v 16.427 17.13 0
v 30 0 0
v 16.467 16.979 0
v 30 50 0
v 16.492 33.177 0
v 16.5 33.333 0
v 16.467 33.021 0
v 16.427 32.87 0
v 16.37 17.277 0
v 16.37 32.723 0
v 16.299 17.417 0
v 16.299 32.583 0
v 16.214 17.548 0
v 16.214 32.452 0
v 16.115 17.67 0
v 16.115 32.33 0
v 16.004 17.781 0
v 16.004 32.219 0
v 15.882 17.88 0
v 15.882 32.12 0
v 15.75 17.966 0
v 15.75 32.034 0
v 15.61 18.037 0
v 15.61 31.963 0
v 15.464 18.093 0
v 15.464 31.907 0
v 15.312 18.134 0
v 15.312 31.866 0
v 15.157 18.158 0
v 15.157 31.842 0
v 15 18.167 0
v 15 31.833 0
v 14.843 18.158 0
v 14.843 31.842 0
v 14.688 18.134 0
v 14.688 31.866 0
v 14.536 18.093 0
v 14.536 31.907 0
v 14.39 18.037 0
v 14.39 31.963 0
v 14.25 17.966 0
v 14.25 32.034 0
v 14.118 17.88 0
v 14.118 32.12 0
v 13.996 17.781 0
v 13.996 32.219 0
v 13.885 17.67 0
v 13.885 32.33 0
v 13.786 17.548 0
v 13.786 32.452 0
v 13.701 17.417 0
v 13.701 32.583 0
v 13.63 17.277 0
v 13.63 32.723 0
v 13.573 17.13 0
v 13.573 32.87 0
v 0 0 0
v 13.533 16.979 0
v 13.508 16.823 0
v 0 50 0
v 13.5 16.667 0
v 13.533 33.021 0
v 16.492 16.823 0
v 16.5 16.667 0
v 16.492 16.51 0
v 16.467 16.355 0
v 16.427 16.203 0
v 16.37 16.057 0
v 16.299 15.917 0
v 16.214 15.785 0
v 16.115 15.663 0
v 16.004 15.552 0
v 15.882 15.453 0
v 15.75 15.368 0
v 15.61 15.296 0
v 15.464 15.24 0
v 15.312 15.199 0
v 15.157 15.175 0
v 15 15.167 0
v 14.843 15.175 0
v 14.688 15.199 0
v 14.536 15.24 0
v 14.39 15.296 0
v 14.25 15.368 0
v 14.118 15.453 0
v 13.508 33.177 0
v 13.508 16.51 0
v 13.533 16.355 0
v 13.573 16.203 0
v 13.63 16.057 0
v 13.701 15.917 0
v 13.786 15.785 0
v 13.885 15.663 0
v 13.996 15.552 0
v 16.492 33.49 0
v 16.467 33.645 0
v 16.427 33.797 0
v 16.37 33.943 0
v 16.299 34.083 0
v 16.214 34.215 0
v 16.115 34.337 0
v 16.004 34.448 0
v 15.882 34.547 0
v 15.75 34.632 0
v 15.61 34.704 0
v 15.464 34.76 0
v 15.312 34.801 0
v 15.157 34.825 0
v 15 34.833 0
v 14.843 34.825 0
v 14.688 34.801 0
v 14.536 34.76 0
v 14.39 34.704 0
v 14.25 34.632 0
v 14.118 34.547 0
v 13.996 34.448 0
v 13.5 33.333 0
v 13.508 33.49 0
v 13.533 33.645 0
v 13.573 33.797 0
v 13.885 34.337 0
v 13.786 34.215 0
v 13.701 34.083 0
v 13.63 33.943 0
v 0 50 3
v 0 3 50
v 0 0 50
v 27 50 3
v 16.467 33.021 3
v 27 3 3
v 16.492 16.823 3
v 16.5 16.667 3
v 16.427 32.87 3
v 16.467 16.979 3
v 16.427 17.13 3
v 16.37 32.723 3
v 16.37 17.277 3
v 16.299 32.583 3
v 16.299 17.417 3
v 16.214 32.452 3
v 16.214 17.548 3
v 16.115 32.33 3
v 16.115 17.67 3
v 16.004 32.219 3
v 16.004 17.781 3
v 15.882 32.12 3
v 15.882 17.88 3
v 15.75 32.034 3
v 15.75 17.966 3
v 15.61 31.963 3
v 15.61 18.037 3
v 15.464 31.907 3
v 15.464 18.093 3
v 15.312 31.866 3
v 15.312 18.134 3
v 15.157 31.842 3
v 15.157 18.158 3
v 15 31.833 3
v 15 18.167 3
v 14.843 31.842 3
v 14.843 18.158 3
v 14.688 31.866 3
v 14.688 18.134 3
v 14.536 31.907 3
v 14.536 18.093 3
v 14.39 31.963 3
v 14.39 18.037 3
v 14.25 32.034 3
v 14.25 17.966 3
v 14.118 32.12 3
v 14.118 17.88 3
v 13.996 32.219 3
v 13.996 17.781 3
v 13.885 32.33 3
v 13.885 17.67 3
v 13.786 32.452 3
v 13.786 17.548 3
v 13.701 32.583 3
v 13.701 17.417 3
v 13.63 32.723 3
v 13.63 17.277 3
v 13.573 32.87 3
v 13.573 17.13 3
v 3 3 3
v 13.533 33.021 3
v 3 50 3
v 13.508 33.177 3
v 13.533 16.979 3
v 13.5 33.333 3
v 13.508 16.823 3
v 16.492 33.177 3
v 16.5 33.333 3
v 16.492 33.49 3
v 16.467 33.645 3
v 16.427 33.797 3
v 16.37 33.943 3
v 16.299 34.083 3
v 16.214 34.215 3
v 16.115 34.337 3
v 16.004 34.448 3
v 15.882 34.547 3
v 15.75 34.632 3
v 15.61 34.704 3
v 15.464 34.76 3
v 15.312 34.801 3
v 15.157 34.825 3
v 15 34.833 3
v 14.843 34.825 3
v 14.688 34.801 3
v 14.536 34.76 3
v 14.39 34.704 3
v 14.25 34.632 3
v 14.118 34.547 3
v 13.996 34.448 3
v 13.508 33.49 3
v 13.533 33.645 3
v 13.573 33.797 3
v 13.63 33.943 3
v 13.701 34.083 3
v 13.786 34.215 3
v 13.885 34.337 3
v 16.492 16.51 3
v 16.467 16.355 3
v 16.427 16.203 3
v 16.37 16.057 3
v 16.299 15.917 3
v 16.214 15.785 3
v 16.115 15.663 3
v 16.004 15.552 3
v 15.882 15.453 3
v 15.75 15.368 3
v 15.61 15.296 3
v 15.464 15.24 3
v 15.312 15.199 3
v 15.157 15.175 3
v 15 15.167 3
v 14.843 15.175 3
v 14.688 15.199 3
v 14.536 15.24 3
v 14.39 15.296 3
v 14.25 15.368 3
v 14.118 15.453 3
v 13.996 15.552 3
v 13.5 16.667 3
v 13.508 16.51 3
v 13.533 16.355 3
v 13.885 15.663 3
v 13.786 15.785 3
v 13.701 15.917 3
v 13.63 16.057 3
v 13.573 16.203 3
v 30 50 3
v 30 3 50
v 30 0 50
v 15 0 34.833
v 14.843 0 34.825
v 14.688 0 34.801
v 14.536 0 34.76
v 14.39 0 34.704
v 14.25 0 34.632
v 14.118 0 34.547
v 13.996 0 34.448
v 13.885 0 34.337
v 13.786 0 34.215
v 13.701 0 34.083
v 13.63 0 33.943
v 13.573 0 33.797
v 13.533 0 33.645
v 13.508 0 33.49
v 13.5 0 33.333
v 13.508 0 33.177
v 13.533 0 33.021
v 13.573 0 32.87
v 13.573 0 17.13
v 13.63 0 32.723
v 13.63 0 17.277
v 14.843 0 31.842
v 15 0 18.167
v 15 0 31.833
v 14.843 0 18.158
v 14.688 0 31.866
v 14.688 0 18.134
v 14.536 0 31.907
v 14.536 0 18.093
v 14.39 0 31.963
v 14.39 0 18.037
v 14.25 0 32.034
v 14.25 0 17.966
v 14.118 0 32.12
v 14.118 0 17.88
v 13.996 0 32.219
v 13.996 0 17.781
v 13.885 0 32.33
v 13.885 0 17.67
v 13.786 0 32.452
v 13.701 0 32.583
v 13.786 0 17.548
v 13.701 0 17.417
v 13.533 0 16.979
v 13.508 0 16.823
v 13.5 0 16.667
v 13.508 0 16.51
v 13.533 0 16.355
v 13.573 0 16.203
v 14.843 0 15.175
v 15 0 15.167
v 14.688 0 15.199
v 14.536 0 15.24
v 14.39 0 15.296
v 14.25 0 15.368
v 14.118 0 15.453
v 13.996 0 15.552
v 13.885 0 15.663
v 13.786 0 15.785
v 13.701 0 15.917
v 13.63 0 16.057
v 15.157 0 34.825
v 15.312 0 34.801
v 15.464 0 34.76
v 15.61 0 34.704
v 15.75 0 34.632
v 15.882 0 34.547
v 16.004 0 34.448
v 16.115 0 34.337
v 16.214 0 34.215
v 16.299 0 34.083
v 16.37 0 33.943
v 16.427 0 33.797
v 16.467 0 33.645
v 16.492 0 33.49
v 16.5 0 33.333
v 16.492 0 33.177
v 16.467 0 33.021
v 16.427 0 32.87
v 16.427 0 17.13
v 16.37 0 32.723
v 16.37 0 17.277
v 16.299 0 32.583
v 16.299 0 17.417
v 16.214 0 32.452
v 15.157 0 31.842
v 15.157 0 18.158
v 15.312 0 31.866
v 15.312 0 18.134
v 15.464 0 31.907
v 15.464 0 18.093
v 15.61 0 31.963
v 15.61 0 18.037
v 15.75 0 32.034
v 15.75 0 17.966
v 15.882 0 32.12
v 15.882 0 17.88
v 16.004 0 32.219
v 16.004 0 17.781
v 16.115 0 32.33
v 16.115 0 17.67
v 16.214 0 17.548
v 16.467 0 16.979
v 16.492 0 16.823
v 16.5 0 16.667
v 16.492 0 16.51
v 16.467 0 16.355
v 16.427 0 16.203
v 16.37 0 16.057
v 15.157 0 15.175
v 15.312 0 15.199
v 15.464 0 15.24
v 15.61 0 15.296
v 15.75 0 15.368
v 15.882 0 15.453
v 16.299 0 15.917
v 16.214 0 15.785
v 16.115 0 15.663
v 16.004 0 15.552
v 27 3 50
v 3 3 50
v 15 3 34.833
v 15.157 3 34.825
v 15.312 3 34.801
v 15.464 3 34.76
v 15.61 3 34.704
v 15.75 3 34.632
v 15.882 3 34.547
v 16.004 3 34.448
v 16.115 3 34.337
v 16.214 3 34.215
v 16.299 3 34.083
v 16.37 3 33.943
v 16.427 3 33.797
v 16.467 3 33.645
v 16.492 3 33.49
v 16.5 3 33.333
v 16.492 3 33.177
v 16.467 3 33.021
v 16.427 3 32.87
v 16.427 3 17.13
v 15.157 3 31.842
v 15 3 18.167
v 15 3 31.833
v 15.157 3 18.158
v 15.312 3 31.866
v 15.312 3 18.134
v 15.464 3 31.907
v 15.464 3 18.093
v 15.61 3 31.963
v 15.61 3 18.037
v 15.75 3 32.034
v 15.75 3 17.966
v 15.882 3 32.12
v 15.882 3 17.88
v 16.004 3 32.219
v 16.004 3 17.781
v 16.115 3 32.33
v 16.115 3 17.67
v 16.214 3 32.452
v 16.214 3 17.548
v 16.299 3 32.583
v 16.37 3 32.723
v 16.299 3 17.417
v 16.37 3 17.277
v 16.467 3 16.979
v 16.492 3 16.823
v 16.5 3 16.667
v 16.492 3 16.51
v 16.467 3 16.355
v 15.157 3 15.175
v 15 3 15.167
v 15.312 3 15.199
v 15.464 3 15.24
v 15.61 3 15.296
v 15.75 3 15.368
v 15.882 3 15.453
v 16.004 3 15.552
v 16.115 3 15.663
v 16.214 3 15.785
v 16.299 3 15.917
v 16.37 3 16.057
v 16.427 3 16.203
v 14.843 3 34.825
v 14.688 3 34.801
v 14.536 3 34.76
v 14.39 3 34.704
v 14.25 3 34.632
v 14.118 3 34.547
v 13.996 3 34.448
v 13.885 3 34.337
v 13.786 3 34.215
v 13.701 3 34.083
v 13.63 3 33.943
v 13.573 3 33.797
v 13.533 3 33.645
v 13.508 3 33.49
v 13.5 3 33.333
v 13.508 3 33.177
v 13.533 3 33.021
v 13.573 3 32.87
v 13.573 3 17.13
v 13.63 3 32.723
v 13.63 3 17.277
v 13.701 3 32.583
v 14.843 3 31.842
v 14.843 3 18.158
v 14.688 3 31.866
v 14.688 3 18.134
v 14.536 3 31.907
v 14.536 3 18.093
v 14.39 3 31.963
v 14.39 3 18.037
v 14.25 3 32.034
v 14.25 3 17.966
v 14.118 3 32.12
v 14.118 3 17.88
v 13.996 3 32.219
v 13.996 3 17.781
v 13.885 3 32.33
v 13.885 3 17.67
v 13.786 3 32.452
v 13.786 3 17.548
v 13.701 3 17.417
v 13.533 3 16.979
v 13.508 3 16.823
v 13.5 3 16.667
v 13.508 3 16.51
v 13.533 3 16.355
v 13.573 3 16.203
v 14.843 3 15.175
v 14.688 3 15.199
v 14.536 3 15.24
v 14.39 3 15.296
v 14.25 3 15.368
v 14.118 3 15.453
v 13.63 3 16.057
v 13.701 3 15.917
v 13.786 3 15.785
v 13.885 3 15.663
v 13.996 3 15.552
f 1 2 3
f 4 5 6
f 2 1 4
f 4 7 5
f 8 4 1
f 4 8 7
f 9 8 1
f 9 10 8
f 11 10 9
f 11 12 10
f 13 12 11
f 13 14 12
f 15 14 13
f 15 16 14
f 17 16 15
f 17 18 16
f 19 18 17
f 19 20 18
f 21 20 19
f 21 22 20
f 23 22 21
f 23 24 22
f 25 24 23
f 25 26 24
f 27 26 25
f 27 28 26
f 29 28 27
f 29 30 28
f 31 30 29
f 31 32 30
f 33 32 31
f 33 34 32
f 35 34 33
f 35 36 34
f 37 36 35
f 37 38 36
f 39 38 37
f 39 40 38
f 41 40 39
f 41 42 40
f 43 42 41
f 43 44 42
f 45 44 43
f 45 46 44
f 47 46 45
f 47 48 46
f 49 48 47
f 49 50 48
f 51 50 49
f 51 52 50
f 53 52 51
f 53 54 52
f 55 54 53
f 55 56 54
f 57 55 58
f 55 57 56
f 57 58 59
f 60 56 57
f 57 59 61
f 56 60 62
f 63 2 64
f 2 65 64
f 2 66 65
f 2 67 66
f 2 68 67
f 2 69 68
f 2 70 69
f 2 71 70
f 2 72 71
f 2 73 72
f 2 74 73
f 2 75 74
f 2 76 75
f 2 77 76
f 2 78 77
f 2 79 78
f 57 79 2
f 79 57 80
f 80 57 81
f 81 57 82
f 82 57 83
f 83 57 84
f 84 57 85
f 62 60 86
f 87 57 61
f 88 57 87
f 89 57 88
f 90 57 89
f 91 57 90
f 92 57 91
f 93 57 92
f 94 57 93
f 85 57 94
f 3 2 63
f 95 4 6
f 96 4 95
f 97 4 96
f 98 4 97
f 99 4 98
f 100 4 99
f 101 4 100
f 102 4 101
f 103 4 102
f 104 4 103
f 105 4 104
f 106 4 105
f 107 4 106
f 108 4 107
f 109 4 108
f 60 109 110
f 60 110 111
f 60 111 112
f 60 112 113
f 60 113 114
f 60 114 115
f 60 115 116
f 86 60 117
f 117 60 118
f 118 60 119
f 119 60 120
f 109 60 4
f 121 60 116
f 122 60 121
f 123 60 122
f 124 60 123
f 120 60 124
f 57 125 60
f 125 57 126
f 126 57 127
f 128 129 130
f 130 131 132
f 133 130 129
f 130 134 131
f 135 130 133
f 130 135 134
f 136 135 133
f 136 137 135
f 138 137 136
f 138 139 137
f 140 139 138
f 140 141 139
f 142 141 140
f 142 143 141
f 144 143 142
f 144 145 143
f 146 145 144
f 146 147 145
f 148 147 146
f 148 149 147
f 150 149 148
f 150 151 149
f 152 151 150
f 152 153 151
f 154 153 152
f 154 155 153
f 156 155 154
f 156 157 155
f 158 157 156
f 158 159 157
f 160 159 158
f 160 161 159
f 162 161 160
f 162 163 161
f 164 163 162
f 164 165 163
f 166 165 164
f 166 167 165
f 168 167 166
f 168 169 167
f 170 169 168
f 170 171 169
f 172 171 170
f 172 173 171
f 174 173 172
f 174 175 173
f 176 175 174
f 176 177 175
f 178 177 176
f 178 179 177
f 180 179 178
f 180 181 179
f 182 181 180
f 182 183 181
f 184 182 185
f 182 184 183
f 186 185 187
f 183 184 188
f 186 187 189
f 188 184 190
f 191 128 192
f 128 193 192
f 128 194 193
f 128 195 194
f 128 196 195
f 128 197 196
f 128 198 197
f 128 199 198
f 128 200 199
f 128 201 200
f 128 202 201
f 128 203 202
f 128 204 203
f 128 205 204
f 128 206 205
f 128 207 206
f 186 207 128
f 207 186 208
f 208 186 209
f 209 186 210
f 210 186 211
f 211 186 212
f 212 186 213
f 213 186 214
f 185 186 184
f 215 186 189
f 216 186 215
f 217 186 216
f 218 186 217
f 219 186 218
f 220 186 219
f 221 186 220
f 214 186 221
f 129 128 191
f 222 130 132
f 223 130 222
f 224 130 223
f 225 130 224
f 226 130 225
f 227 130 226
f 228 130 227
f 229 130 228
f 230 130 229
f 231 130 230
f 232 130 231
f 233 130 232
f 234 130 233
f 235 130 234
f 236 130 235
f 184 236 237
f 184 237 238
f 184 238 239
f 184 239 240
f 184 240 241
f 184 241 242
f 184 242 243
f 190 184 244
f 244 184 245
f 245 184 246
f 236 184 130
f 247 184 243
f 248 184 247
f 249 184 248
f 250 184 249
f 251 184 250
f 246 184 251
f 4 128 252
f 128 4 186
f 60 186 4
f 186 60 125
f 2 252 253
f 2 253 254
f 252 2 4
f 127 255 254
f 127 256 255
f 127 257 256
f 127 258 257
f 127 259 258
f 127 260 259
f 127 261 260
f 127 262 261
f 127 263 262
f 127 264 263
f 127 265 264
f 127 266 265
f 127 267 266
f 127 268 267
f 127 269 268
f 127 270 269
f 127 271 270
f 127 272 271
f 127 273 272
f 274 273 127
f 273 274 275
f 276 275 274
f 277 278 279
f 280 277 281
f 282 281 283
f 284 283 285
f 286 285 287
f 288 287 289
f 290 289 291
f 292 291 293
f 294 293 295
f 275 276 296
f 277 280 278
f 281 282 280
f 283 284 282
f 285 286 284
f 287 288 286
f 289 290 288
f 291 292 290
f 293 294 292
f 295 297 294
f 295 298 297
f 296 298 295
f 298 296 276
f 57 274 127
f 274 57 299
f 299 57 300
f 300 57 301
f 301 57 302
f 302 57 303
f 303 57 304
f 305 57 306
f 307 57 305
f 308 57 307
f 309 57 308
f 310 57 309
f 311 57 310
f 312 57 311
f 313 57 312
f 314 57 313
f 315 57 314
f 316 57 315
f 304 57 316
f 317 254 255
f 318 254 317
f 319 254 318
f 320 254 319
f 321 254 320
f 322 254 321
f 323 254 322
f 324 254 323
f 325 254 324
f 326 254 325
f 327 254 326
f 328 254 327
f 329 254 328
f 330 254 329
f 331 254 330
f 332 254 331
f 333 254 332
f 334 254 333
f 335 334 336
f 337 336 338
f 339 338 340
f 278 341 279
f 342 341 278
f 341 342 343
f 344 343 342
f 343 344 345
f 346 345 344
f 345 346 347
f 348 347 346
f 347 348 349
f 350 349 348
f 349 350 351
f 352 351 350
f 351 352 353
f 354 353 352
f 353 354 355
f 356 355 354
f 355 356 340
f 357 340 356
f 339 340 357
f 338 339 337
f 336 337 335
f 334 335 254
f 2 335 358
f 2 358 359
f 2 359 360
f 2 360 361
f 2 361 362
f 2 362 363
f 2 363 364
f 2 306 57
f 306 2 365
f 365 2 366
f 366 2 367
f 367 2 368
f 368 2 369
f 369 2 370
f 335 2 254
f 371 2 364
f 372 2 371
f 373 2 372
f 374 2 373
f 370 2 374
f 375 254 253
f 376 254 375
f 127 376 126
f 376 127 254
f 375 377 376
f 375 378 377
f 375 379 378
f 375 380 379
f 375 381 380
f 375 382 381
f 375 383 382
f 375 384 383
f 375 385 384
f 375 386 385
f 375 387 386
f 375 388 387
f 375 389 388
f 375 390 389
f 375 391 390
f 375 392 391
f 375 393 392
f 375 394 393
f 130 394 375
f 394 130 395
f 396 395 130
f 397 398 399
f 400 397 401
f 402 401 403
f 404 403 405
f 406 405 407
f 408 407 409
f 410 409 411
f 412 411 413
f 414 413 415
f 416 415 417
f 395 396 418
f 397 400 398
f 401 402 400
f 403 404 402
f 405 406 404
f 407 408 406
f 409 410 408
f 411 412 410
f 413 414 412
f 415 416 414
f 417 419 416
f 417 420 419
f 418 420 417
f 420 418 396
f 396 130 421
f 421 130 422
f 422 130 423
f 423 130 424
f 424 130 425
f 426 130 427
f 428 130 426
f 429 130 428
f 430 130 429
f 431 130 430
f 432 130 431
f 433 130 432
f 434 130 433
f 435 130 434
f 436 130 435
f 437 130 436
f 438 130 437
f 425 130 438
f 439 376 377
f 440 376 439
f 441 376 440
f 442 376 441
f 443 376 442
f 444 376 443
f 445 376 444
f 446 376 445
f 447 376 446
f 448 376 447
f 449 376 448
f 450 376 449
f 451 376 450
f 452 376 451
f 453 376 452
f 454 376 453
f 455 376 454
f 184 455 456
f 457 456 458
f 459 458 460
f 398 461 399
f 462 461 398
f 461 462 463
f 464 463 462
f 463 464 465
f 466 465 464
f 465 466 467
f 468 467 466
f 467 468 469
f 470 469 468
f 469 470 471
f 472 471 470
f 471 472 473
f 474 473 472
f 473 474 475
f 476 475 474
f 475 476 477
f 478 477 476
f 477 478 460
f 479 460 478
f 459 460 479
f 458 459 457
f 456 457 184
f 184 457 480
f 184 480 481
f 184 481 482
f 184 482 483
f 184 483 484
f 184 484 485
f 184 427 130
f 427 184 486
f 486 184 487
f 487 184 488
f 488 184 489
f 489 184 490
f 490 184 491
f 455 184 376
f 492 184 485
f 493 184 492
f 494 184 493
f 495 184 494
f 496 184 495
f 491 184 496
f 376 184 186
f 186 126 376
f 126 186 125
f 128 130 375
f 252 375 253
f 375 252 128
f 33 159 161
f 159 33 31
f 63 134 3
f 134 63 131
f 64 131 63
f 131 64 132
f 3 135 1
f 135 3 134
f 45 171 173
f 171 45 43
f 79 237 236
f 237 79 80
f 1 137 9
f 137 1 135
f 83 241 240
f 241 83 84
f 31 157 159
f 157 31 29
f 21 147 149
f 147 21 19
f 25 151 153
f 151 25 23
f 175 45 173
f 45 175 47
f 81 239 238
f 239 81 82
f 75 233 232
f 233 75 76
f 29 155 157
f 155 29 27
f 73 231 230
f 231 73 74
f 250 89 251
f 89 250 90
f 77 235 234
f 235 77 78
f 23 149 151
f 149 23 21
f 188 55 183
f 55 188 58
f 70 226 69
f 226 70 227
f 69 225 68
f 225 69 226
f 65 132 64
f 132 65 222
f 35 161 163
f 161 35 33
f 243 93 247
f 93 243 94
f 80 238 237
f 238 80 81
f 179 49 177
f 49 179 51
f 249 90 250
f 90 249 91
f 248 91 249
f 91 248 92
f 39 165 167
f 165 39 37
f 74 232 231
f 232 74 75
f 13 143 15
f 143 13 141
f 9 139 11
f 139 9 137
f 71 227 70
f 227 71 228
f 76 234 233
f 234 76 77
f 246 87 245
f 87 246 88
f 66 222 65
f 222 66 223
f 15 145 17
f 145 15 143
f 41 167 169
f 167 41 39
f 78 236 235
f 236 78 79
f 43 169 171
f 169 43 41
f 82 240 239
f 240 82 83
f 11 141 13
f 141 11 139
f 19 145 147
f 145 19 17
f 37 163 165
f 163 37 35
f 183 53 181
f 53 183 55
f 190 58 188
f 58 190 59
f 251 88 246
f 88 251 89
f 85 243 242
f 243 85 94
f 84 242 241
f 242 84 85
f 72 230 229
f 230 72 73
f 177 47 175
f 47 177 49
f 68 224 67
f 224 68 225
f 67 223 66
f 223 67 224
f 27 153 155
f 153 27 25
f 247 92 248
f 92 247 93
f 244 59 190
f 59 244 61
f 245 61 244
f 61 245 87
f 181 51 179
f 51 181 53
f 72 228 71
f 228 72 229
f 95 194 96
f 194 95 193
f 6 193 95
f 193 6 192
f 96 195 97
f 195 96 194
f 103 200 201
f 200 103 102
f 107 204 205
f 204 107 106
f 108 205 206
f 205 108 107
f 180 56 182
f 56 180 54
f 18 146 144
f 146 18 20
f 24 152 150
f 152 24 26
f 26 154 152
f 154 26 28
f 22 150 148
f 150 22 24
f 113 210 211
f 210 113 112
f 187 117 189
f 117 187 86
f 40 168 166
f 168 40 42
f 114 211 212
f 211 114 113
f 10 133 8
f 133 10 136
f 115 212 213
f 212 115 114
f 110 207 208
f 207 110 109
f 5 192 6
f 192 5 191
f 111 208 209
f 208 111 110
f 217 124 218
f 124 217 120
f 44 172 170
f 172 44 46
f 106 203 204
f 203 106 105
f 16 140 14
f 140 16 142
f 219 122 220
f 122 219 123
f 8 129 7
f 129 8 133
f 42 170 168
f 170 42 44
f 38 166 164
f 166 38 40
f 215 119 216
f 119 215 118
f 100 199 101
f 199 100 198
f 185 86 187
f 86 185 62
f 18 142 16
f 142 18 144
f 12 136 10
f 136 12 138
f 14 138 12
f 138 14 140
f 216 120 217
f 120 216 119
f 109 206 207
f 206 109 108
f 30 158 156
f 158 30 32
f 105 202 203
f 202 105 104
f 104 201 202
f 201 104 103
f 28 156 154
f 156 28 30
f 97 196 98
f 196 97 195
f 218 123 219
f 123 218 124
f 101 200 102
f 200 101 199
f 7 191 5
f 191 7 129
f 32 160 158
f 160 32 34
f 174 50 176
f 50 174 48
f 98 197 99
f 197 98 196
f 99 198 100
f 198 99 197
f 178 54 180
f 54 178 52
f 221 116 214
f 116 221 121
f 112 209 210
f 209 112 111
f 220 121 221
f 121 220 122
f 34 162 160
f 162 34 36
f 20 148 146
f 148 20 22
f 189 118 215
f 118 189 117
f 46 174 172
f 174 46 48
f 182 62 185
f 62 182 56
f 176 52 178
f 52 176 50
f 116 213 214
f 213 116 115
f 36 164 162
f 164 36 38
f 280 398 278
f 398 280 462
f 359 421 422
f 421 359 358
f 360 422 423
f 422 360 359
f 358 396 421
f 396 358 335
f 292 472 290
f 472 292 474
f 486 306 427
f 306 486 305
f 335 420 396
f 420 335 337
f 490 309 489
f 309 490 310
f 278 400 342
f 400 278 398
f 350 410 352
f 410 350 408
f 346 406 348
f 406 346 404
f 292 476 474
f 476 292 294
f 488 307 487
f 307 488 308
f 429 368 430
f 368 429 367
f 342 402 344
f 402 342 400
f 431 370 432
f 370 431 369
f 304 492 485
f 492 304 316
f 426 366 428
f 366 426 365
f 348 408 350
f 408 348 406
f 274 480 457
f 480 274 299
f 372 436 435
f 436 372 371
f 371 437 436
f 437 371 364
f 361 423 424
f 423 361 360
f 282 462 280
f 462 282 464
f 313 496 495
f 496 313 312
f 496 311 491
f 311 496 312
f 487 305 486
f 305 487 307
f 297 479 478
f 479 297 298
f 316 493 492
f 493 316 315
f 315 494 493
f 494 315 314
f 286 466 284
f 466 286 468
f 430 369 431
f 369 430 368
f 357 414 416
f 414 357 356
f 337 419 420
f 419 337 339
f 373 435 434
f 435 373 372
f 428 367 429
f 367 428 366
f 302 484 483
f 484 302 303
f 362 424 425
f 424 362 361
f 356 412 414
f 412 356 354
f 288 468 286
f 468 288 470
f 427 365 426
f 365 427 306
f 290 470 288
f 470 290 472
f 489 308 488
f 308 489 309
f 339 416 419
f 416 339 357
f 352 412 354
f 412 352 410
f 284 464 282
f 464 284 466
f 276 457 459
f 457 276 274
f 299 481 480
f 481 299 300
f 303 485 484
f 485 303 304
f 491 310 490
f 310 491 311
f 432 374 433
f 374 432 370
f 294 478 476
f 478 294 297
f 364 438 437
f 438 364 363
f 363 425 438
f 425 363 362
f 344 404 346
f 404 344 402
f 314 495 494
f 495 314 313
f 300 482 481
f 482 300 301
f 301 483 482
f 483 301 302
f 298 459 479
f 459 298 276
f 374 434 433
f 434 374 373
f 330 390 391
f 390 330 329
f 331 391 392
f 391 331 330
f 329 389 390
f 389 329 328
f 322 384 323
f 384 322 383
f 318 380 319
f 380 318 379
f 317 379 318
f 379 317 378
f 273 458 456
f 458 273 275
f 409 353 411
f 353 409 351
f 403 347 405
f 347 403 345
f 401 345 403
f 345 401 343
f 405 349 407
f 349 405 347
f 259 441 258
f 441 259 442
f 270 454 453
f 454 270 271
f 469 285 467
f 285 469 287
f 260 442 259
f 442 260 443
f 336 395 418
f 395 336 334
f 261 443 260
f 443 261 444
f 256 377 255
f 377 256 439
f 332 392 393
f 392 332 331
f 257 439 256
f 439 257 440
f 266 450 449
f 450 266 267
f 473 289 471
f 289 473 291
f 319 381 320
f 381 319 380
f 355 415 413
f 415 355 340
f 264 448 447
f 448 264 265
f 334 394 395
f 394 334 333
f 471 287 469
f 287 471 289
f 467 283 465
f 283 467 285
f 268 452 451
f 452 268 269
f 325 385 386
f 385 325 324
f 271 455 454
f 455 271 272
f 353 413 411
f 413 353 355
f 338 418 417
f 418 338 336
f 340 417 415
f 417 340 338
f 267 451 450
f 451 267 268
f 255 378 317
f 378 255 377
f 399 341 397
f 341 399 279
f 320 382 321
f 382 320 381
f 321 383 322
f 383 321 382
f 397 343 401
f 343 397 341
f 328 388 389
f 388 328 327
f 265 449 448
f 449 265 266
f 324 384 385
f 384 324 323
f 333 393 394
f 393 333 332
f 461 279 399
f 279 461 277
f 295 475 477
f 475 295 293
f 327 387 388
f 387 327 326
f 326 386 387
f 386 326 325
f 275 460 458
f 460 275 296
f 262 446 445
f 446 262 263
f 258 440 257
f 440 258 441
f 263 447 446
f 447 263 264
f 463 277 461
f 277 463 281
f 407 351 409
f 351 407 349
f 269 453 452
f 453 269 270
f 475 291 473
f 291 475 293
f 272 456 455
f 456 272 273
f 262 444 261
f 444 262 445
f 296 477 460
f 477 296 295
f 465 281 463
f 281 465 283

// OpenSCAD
// t-slot 90 deg bracket

size=50;
width=30; // 30mm t-slot
thickness=3;
hole_diameter=3;

bracket();

module bracket() {
  $fn=60;
  difference() {
    body();
    holes();
  }  
}

module body() {
  base();
  translate([0,thickness,thickness])
    rotate([0,90,0])
      side();
  translate([width-thickness,thickness,thickness])
    rotate([0,90,0])
      side();
}

module holes() {
  holes_bottom();
  translate([0,thickness,0])
    rotate([90,0,0])
      holes_bottom();
}

module holes_bottom() {
  translate([width/2,size/3,0])
    cylinder(d=hole_diameter, h=thickness+1);
  translate([width/2,2*(size/3),0])
    cylinder(d=hole_diameter, h=thickness+1);
}

module base() {
  linear_extrude(thickness)
    bottom_sketch();  
  back();
}

module side() {
  linear_extrude(thickness)
    side_sketch();
}

module side_sketch() { 
  polygon([[0,0],[-(size-thickness),0],[0,size-thickness]]);
}

module bottom_sketch() {
  square([width,size]);
}

module back() {
  translate([0,thickness,0])
    rotate([90,0,0])
      linear_extrude(thickness)  
        bottom_sketch();
}
